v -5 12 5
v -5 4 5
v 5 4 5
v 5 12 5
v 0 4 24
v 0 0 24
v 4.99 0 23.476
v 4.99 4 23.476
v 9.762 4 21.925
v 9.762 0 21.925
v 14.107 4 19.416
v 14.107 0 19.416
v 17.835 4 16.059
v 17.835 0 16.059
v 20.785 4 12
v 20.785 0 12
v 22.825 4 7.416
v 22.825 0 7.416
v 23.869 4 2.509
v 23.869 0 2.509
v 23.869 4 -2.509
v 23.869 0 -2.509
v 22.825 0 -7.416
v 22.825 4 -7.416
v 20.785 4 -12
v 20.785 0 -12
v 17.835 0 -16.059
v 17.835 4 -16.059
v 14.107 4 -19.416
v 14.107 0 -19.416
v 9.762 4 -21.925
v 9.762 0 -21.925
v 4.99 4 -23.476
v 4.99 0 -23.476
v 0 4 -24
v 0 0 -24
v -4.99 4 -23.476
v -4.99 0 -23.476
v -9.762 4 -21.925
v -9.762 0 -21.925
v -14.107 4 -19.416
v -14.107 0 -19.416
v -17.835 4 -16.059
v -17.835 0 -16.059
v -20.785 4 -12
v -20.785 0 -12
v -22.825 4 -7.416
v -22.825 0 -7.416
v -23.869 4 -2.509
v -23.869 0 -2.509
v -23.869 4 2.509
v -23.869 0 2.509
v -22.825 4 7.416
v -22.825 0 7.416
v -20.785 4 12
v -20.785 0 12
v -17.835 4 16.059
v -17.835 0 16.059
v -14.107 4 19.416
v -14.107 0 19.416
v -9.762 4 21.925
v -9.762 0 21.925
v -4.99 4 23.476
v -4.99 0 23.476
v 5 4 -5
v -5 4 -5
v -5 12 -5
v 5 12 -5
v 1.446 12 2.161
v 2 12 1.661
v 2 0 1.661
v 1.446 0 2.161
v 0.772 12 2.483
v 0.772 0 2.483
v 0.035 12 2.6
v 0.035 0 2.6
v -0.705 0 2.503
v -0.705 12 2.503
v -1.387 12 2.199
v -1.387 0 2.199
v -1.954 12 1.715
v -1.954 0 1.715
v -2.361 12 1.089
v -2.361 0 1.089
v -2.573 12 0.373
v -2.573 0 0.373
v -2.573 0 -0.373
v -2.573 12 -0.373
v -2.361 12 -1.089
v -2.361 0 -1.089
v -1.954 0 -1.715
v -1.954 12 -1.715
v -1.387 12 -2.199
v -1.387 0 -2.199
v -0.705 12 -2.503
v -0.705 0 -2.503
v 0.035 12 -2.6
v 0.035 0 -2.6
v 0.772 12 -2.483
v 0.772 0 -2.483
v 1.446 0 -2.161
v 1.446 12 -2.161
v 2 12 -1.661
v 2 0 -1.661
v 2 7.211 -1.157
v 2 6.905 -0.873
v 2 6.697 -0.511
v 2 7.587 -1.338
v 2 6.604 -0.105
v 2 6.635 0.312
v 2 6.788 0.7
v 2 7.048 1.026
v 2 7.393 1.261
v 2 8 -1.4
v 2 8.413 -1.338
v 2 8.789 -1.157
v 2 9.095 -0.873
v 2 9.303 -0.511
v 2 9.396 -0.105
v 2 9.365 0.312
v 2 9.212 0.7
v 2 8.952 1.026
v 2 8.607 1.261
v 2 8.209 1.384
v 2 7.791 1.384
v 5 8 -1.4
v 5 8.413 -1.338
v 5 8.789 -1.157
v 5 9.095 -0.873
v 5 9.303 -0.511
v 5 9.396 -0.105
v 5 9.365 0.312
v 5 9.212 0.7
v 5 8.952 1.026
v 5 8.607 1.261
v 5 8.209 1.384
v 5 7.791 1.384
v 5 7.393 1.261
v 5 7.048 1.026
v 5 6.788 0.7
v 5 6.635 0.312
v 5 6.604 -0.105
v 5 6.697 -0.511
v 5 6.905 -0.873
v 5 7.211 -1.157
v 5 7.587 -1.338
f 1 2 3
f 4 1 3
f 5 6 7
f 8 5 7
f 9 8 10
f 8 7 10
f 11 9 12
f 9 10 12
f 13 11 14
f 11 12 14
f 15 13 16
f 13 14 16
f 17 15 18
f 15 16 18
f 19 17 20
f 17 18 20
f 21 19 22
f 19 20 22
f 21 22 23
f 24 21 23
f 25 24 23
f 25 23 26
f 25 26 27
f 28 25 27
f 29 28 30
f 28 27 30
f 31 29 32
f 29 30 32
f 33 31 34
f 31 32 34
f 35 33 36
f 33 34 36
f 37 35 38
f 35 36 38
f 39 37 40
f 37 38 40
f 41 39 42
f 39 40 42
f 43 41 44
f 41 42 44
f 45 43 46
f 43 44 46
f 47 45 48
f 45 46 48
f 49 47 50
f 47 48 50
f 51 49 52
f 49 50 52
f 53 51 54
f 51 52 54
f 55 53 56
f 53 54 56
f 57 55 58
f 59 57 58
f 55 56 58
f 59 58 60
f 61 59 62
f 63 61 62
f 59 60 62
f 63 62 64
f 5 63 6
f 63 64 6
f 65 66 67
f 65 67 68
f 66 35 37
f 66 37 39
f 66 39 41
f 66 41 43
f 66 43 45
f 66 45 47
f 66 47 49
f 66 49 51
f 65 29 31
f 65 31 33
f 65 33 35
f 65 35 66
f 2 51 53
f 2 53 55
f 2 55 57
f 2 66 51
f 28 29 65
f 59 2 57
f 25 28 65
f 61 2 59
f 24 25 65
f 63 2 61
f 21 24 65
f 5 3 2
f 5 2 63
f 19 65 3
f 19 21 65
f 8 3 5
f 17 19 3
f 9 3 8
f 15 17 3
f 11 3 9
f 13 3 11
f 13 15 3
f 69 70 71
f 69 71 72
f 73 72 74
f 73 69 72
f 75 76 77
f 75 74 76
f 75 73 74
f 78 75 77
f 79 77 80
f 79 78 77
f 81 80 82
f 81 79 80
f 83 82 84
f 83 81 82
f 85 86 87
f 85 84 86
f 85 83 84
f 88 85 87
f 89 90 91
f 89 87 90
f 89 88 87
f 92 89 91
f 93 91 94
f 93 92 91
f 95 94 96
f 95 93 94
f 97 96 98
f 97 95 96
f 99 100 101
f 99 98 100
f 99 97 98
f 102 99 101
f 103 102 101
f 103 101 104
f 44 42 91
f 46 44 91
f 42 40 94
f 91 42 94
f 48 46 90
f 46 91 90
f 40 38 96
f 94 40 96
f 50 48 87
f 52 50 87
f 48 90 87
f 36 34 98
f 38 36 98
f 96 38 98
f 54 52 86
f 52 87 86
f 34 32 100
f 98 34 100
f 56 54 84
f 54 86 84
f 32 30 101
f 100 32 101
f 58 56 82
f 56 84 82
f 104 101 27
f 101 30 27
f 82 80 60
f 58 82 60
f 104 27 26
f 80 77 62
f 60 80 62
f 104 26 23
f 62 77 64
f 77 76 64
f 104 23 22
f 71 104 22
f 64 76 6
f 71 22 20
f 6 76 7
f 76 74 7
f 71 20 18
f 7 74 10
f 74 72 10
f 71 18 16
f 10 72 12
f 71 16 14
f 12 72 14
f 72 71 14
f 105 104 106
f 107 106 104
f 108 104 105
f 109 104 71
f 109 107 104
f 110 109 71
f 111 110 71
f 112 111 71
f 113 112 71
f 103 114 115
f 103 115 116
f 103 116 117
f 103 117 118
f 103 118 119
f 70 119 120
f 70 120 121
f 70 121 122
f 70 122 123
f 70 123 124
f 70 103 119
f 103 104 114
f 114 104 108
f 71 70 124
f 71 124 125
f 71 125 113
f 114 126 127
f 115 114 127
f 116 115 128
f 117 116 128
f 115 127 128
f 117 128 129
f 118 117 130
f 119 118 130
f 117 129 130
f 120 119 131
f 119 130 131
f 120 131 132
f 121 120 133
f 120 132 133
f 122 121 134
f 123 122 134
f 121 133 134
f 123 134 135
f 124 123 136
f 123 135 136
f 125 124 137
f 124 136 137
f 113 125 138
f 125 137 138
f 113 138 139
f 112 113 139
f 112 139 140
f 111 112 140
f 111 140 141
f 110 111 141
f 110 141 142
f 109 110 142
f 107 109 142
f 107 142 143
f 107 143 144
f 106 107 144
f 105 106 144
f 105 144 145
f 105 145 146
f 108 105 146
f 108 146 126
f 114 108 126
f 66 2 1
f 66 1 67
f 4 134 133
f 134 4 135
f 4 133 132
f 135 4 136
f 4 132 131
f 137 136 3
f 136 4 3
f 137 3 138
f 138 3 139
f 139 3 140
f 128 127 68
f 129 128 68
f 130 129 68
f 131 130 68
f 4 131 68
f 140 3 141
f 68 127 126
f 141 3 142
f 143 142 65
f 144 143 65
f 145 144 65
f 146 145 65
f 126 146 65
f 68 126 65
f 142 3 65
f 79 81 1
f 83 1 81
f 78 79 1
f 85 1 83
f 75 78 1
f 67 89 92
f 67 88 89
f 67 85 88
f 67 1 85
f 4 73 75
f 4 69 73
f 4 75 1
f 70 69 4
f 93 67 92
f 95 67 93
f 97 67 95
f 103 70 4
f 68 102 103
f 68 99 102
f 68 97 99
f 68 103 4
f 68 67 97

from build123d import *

# Parameters (mm, degrees)
SKETCH1_R               = 24
BOSS_EXTRUDE1_DEPTH     = 4
SKETCH2_W               = 10
SKETCH2_H               = 10
BOSS_EXTRUDE2_DEPTH     = 8
SKETCH4_R               = 1.4
CUT_EXTRUDE2_DEPTH      = 4
CUT_EXTRUDE3_DEPTH      = 35.871191548
CUT_EXTRUDE3_DEPTH_BACK = 35.871191548


with BuildPart() as part:
    # Sketch1 → Boss-Extrude1 (new body)
    with BuildSketch(Plane(origin=(0, 0, 0), x_dir=(1, 0, 0), z_dir=(0, 1, 0))):
        with Locations(Location((0, 0, 0), (0, 0, 270))):
            Circle(SKETCH1_R)
        with BuildLine():
            Line((2, 1.5), (2, -1.5))
            ThreePointArc((2, -1.5), (-2.5, 0), (2, 1.5))
        make_face(mode=Mode.SUBTRACT)
    extrude(amount=BOSS_EXTRUDE1_DEPTH)

    # Sketch2 → Boss-Extrude2 (add)
    with BuildSketch(Plane(origin=(0, 4, 0), x_dir=(1, 0, 0), z_dir=(0, 1, 0))):
        Rectangle(SKETCH2_W, SKETCH2_H)
    extrude(amount=BOSS_EXTRUDE2_DEPTH)

    # Sketch4 → Cut-Extrude2 (cut)
    with BuildSketch(Plane(origin=(5, 0, 0), x_dir=(0, 0, -1), z_dir=(1, 0, 0))):
        with Locations((0, 8)):
            Circle(SKETCH4_R)
    extrude(amount=-CUT_EXTRUDE2_DEPTH, mode=Mode.SUBTRACT)

    # Sketch3 → Cut-Extrude3 (cut, two sides: drawn at the far end of the back side and taken through both)
    with BuildSketch(Plane.XZ.offset(-4).offset(-CUT_EXTRUDE3_DEPTH_BACK)):
        with BuildLine():
            Line((2, -1.661324773), (2, 1.661324773))
            ThreePointArc((2, 1.661324773), (-2.6, 0), (2, -1.661324773))
        make_face()
    extrude(amount=CUT_EXTRUDE3_DEPTH + CUT_EXTRUDE3_DEPTH_BACK, mode=Mode.SUBTRACT)


solid = part.part
